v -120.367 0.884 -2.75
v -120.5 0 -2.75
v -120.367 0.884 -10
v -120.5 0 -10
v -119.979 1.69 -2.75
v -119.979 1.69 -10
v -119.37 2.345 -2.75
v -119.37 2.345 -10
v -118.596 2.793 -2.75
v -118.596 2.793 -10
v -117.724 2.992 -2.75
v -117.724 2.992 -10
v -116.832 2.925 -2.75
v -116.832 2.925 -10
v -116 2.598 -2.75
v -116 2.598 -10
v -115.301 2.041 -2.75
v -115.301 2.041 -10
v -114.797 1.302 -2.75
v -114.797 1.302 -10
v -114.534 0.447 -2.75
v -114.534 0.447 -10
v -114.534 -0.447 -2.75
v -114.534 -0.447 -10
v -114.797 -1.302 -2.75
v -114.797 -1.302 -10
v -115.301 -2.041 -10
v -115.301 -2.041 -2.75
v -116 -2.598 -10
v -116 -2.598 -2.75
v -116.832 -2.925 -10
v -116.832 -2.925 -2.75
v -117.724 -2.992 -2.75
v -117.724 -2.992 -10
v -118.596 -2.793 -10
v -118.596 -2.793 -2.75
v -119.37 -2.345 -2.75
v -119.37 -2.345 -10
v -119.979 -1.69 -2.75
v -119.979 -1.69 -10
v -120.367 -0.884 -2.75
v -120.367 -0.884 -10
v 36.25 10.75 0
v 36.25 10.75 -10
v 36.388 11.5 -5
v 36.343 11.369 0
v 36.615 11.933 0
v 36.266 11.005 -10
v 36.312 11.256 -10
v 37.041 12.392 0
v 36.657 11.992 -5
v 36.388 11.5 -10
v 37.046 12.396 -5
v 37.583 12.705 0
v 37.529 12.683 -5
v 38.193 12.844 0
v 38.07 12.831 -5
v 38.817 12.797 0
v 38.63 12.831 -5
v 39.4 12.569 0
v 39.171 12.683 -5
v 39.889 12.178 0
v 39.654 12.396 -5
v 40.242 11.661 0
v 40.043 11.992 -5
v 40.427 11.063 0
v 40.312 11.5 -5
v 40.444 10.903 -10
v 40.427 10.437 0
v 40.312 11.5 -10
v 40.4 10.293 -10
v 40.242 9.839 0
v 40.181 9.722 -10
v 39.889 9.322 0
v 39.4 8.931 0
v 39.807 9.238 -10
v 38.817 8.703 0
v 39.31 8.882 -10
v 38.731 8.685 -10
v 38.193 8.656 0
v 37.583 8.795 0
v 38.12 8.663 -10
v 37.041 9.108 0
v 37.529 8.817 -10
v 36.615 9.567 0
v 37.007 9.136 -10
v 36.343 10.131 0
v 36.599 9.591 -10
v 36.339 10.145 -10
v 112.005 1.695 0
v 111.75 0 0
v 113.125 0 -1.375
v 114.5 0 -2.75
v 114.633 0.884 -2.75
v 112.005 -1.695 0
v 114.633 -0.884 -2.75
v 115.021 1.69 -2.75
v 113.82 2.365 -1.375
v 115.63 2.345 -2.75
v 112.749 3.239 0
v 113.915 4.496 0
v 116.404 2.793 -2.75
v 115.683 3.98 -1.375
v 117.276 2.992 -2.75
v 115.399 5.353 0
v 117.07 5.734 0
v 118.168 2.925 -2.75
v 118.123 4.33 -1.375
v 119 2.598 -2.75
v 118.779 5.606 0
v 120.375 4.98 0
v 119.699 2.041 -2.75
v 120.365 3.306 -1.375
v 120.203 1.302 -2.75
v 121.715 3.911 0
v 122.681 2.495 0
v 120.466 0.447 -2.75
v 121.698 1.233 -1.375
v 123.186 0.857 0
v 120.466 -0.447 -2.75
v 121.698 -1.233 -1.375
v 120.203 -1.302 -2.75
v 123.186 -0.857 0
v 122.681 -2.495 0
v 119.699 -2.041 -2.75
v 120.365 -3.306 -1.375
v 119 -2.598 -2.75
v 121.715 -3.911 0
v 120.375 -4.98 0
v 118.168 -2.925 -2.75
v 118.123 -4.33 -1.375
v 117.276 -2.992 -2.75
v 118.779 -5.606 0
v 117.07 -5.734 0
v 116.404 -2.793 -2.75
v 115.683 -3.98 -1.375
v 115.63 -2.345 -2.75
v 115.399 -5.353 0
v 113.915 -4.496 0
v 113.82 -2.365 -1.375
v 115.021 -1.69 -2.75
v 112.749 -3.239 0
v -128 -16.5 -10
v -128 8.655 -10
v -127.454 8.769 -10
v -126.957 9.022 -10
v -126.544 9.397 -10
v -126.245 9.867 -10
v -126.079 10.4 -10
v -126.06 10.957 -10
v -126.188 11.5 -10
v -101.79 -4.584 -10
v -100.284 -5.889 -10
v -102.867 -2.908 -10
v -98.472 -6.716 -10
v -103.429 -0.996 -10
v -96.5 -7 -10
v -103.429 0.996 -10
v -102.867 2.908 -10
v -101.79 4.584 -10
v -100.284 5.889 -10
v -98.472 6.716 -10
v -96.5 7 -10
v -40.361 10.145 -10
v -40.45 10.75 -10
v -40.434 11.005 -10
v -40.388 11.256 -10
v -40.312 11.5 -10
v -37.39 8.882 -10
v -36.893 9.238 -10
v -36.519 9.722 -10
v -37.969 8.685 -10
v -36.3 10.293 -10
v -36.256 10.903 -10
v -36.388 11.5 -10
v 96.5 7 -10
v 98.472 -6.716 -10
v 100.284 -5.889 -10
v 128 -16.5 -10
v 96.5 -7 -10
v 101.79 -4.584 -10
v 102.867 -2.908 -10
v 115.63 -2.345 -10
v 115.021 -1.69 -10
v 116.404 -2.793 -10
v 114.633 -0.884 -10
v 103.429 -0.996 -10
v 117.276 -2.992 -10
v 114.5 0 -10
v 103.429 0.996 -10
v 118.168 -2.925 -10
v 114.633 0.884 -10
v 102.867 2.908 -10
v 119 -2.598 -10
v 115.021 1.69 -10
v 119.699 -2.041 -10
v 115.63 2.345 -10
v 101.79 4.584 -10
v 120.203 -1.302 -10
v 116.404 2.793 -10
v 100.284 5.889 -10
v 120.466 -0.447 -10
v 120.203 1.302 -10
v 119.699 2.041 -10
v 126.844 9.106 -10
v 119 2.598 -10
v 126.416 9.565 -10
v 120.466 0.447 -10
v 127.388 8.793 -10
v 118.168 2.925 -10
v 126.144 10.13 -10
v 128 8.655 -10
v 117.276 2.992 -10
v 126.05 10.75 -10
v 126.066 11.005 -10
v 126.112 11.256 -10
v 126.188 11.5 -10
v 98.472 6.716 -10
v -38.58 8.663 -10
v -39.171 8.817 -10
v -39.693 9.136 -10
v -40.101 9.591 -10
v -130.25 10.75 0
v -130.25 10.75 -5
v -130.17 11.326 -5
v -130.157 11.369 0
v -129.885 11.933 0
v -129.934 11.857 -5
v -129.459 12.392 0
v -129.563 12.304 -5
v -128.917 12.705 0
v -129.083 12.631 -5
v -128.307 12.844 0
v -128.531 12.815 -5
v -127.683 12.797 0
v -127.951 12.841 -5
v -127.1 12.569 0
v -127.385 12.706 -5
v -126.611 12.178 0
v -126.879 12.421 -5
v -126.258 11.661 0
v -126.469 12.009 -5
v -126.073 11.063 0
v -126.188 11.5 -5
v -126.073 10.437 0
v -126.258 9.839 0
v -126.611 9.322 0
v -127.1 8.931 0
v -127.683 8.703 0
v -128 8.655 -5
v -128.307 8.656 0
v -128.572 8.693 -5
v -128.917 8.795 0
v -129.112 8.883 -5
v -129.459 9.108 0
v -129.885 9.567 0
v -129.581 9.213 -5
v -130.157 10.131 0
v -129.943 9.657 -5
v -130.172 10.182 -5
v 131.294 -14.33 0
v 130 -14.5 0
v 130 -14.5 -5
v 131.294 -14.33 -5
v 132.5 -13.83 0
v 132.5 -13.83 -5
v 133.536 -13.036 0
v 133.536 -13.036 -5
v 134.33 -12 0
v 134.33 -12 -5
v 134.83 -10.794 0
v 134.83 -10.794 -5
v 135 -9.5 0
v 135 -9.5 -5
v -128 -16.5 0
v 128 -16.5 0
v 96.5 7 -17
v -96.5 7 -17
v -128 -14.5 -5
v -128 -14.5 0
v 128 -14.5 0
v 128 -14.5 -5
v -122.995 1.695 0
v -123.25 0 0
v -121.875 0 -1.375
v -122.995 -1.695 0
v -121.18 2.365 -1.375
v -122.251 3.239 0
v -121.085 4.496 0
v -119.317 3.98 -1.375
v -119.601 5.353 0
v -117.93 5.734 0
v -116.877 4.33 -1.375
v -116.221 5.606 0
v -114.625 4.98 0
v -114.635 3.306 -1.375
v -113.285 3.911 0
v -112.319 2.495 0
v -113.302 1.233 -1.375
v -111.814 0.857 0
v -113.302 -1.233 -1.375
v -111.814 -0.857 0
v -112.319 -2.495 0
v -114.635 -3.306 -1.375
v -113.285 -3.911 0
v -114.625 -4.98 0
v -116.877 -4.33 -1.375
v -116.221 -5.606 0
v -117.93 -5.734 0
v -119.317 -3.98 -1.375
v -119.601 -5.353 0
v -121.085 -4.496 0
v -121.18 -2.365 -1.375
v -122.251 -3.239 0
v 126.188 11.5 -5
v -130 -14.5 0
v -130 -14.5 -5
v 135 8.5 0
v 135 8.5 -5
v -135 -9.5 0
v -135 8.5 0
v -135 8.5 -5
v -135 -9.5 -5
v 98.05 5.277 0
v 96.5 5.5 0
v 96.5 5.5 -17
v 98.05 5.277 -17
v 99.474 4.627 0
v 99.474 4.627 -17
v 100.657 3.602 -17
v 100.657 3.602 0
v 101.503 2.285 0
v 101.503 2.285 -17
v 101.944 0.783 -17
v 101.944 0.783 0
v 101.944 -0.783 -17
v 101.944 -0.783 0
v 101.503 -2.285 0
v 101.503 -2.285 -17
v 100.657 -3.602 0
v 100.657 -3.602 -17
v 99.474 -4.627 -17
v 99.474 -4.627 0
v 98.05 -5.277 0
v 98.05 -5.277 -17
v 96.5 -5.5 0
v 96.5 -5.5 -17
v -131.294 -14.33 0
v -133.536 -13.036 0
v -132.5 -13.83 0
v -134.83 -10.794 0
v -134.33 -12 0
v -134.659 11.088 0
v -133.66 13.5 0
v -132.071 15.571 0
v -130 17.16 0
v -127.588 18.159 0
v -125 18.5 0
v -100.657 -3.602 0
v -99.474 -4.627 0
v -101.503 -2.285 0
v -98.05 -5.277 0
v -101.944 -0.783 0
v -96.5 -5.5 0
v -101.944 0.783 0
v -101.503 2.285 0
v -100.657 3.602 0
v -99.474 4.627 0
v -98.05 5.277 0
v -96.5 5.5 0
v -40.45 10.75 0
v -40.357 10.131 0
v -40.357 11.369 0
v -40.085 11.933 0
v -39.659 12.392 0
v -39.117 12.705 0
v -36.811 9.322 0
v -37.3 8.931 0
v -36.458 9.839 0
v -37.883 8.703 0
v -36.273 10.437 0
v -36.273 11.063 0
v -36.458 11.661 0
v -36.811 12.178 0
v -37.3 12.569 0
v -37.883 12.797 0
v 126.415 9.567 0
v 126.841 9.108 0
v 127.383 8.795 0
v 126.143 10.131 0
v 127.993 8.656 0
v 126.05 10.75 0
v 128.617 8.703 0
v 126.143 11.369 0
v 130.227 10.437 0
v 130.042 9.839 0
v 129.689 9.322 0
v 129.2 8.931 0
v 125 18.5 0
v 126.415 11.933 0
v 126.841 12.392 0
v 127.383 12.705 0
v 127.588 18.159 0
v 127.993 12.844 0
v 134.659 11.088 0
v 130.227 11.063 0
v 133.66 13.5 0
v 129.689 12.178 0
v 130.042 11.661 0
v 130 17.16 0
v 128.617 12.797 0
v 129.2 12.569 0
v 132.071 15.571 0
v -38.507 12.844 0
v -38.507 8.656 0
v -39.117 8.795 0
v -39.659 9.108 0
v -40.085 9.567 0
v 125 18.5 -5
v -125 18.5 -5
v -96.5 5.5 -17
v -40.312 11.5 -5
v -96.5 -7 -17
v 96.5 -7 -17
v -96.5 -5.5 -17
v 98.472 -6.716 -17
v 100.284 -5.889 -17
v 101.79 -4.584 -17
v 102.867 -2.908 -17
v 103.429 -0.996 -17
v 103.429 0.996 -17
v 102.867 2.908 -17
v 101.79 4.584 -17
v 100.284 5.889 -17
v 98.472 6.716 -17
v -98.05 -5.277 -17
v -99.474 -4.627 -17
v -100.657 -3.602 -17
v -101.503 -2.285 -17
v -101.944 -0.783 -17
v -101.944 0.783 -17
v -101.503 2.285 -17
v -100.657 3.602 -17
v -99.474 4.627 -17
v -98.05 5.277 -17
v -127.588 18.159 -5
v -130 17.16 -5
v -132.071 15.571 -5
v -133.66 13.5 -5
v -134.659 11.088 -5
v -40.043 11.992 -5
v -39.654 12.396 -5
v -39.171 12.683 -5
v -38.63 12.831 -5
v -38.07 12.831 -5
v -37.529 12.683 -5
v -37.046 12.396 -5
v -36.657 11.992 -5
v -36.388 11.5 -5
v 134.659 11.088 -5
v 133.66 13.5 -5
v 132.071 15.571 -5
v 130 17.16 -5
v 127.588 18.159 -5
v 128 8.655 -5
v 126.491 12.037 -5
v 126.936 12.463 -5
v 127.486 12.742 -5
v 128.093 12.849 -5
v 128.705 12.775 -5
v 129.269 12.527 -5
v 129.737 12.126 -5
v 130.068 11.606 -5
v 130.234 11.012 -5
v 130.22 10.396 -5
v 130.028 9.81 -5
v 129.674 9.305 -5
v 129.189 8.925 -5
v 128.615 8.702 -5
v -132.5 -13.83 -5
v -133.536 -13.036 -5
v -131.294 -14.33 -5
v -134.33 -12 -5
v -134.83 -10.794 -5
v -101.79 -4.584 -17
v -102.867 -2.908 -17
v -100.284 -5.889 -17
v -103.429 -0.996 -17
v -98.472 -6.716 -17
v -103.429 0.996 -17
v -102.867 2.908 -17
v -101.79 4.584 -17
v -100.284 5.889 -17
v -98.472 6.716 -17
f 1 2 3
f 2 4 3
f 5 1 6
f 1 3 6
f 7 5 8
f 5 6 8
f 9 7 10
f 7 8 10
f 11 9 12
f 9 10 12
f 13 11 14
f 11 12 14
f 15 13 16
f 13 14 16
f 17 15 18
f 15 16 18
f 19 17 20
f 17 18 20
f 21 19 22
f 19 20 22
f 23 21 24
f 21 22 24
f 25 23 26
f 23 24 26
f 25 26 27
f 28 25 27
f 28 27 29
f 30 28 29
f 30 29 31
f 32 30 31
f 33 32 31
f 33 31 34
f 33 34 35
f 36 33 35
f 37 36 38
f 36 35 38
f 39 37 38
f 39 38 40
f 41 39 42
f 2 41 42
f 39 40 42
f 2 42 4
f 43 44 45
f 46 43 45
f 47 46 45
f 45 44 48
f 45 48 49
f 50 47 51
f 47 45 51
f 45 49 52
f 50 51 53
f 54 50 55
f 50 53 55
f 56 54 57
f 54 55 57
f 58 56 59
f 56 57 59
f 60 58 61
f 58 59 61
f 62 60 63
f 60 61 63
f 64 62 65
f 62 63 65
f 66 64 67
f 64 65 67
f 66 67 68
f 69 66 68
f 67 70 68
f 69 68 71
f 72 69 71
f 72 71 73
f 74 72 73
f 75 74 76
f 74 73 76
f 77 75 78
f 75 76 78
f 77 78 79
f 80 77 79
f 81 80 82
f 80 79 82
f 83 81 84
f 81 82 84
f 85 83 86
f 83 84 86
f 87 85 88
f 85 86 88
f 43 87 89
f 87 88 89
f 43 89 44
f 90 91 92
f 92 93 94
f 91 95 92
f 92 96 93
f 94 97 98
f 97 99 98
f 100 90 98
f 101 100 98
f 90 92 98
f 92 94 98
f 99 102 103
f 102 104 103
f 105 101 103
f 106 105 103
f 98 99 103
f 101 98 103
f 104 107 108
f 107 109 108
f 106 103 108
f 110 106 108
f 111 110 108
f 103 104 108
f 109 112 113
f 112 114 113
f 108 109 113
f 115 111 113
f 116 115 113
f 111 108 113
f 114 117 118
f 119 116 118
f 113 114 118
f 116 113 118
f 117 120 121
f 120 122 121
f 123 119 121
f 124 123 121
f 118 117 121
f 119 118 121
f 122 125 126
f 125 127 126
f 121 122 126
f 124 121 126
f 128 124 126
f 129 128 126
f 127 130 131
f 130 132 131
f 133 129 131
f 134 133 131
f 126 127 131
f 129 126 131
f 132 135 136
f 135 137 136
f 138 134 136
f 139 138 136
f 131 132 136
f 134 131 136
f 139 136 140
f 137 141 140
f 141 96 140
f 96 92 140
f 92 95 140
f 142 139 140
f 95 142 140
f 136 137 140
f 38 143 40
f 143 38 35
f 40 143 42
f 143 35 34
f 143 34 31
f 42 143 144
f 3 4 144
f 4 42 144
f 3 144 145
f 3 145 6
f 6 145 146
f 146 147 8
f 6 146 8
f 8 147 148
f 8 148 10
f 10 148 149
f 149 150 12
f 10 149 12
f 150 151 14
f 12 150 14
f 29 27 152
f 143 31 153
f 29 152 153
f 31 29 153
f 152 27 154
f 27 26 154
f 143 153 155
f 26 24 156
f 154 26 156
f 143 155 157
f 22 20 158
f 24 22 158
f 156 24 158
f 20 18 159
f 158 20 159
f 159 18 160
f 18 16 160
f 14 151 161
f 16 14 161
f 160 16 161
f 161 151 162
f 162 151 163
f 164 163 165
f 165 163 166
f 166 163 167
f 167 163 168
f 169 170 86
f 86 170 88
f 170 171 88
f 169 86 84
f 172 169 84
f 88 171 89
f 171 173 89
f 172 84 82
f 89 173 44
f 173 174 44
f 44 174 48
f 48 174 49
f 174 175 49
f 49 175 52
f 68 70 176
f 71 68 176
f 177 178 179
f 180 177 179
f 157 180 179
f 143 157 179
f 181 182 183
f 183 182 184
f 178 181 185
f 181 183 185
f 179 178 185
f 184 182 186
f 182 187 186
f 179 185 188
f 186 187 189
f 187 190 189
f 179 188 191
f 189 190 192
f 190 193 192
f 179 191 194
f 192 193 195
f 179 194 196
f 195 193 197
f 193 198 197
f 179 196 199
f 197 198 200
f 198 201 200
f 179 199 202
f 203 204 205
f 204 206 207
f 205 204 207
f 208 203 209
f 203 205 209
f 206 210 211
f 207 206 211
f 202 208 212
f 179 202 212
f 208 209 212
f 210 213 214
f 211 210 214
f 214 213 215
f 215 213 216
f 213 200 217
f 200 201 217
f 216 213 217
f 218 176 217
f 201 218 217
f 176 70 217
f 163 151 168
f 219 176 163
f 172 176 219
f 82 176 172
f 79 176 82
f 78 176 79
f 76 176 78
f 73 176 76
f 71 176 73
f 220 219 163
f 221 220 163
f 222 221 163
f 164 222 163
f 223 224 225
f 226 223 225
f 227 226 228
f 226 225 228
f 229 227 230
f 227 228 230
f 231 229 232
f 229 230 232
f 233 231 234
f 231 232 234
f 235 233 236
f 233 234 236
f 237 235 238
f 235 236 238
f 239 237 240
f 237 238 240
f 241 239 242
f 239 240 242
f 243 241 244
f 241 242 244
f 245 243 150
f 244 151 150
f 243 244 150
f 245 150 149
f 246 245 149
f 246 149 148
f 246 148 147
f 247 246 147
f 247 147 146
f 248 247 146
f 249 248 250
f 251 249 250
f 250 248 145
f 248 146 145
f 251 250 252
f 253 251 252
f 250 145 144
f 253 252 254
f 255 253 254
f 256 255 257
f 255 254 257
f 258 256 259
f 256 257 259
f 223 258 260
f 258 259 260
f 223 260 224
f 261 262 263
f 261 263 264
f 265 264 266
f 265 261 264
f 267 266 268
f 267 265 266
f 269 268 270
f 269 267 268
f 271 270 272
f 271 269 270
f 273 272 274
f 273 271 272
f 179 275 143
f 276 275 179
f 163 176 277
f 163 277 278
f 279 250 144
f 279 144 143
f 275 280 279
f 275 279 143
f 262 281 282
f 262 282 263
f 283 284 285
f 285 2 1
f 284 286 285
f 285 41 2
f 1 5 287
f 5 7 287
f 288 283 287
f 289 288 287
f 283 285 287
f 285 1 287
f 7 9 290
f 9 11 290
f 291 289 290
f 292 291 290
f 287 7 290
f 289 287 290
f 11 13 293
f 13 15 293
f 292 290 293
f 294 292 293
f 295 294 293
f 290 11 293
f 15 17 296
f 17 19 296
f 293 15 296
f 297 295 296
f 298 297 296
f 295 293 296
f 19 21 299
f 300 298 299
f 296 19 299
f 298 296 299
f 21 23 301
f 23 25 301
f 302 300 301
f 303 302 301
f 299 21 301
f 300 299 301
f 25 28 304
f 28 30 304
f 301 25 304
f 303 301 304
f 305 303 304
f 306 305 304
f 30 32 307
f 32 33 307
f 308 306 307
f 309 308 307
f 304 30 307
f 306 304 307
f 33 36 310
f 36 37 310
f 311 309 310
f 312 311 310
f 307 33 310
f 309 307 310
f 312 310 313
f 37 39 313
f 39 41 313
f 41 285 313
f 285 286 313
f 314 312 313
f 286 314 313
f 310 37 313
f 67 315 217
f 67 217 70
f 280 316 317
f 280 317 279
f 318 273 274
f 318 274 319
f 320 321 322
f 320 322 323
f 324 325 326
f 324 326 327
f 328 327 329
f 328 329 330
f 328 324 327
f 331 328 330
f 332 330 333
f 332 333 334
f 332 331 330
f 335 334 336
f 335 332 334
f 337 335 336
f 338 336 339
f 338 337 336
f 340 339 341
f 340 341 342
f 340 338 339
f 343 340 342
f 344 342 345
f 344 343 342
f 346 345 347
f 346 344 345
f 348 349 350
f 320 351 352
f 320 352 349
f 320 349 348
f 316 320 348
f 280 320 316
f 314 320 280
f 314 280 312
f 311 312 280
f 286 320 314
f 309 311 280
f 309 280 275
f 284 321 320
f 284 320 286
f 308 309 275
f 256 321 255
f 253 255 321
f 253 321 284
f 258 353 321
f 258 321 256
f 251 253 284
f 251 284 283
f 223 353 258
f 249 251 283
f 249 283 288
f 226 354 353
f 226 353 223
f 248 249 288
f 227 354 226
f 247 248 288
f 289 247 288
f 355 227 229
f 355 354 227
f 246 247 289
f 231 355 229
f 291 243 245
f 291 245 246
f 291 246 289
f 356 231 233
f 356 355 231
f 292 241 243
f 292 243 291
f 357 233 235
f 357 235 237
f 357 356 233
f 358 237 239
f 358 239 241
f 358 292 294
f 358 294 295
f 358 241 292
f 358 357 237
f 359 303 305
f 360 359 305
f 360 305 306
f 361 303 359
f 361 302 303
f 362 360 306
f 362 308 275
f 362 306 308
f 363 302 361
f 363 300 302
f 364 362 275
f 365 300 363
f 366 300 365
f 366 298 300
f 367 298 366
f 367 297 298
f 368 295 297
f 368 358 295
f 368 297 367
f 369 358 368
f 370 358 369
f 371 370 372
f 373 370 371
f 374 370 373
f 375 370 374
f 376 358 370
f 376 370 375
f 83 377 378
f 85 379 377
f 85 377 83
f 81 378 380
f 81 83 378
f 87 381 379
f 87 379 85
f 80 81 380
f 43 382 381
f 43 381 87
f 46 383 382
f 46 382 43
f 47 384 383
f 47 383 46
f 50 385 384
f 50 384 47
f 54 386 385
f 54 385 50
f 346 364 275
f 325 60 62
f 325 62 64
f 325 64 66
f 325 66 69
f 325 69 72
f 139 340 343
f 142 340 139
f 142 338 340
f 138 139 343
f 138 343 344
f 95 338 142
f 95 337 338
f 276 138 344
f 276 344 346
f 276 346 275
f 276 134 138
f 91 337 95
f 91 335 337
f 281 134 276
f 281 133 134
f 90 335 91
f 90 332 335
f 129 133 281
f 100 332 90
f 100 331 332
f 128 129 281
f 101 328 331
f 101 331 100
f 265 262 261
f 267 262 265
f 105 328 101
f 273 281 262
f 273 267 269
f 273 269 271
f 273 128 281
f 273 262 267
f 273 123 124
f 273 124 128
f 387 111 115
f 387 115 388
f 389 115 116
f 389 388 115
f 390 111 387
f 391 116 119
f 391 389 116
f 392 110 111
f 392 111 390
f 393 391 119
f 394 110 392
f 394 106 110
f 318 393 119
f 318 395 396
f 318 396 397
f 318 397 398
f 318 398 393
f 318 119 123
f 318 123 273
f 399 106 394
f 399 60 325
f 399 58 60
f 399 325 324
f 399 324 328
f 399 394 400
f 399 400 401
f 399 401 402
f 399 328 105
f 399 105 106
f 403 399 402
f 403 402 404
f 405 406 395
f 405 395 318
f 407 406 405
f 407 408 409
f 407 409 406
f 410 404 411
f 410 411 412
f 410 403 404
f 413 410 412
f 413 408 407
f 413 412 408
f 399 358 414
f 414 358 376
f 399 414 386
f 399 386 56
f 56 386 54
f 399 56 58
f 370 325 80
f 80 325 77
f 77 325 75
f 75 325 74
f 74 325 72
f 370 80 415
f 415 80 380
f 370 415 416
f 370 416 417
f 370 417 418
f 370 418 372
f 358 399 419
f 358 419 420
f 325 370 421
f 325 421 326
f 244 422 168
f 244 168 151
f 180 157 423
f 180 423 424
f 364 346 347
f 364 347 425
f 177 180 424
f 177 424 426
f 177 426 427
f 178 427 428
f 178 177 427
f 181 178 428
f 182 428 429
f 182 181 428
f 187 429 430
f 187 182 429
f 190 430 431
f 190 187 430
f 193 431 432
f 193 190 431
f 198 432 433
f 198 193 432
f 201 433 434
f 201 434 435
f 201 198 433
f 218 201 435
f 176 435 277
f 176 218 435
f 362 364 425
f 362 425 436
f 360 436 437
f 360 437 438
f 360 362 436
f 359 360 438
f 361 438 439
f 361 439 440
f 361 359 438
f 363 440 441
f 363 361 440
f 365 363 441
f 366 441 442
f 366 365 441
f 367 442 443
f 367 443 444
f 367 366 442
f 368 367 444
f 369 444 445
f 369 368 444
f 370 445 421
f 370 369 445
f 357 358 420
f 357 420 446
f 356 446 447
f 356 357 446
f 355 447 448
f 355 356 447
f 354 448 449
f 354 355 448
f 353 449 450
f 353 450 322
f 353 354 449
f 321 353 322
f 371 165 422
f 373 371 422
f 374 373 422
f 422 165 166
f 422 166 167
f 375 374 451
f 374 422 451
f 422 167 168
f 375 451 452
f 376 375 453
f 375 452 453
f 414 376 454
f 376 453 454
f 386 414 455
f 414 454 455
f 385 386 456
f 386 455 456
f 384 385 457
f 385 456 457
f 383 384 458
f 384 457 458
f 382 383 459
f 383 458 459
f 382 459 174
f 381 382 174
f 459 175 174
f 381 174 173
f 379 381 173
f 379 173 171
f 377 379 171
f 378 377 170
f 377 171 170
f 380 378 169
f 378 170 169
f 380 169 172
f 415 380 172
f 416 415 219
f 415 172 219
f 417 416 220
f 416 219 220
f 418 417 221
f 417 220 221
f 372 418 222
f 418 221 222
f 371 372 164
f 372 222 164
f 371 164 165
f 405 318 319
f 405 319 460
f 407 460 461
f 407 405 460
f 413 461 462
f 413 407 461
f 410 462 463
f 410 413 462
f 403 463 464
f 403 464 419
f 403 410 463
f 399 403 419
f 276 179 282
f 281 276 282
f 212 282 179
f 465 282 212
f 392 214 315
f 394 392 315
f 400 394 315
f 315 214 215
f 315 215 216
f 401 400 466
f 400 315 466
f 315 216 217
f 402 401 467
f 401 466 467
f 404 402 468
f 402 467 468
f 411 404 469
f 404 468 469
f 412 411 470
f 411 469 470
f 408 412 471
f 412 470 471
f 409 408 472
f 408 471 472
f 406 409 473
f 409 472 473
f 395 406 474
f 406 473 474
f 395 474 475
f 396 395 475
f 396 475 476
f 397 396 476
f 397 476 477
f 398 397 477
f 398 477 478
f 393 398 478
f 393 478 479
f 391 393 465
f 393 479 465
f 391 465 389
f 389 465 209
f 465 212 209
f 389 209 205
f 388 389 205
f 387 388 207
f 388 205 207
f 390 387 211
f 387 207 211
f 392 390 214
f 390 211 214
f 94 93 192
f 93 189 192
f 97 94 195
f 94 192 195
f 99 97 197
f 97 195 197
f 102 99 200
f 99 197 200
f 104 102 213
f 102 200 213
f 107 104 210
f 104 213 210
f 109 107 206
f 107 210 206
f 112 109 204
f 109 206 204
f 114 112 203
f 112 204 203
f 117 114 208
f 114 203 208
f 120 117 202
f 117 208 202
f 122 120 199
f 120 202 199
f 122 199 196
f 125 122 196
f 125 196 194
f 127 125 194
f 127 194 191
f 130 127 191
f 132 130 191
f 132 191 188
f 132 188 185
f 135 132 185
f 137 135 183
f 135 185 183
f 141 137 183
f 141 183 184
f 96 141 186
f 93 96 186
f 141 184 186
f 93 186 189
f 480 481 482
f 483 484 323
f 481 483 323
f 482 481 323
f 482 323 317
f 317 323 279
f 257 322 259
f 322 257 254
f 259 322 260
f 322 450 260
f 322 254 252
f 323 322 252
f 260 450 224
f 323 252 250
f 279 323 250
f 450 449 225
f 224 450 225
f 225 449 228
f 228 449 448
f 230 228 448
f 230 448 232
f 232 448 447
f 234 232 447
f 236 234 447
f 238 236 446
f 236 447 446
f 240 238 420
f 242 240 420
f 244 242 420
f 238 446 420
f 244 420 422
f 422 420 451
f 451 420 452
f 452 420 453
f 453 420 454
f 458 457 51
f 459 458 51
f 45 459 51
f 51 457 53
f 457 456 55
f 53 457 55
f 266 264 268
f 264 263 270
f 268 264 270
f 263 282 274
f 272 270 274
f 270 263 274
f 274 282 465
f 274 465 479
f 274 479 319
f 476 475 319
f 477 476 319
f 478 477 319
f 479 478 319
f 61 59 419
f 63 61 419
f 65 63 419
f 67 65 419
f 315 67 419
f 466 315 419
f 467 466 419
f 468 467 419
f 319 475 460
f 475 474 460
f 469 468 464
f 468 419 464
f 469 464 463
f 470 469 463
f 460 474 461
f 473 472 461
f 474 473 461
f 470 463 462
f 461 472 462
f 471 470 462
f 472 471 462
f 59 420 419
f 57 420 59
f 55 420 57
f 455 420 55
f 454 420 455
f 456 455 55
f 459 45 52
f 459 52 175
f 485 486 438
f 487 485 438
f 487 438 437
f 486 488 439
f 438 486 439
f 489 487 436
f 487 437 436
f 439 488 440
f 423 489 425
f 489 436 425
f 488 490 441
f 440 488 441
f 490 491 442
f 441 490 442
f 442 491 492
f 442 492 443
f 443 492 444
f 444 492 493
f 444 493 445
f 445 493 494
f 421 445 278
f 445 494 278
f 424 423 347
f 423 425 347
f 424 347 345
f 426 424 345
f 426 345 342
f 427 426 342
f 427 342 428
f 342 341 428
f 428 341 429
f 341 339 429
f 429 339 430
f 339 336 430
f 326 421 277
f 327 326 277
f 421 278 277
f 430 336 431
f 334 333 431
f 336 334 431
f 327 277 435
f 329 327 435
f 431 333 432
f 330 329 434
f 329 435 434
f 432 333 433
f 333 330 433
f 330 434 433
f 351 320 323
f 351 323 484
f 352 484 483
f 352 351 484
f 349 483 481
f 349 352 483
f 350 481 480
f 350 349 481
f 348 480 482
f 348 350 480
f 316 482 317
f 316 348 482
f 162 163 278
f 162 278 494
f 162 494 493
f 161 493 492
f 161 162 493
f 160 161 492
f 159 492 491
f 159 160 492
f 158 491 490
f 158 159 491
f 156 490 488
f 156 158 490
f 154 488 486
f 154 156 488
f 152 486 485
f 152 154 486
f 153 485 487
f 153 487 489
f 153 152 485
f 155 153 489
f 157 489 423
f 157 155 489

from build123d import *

# Parameters (mm, degrees)
F1_DEPTH       = 17
F2_DEPTH       = 10
F3_DEPTH       = 5
F4_D           = 6
F4_CSINK_D     = 11.5
F4_CSINK_ANGLE = 90
F5_D           = 4.2


with BuildPart() as f1:
    # F0 (on Top) → F1 (new body)
    with BuildSketch(Plane.XY):
        with BuildLine():
            ThreePointArc((-96.5, 7), (-103.5, 0), (-96.5, -7))
            Line((-96.5, -7), (96.5, -7))
            ThreePointArc((96.5, -7), (103.5, 0), (96.5, 7))
            Line((96.5, 7), (-96.5, 7))
        make_face()
        with BuildLine():
            ThreePointArc((-96.5, -5.5), (-102, 0), (-96.5, 5.5))
            Line((-96.5, 5.5), (96.5, 5.5))
            ThreePointArc((96.5, 5.5), (102, 0), (96.5, -5.5))
            Line((96.5, -5.5), (-96.5, -5.5))
        make_face(mode=Mode.SUBTRACT)
    extrude(amount=-F1_DEPTH)

    # F0 (on Top) → F2 (join)
    with BuildSketch(Plane.XY):
        Polygon((-128, 11.5), (-128, -14.5), (-128, -16.5), (128, -16.5), (128, -14.5), (128, 11.5), align=None)
        with BuildLine():
            Line((96.5, -7), (-96.5, -7))
            ThreePointArc((-96.5, -7), (-103.5, 0), (-96.5, 7))
            Line((-96.5, 7), (96.5, 7))
            ThreePointArc((96.5, 7), (103.5, 0), (96.5, -7))
        make_face(mode=Mode.SUBTRACT)
    extrude(amount=-F2_DEPTH)

    # F0 (on Top) → F3 (join)
    with BuildSketch(Plane.XY):
        with BuildLine():
            Line((125, 18.5), (-125, 18.5))
            ThreePointArc((-125, 18.5), (-132.0710678119, 15.5710678119), (-135, 8.5))
            Line((-135, 8.5), (-135, -9.5))
            ThreePointArc((-135, -9.5), (-133.5355339059, -13.0355339059), (-130, -14.5))
            Line((-130, -14.5), (-128, -14.5))
            Line((-128, -14.5), (-128, 11.5))
            Line((-128, 11.5), (128, 11.5))
            Line((128, 11.5), (128, -14.5))
            Line((128, -14.5), (130, -14.5))
            ThreePointArc((130, -14.5), (133.5355339059, -13.0355339059), (135, -9.5))
            Line((135, -9.5), (135, 8.5))
            ThreePointArc((135, 8.5), (132.0710678119, 15.5710678119), (125, 18.5))
        make_face()
    extrude(amount=-F3_DEPTH)

    # F4 (through all)
    with Locations(Plane.XY):
        with Locations((117.5, 0), (-117.5, 0)):
            CounterSinkHole(F4_D / 2, F4_CSINK_D / 2, counter_sink_angle=F4_CSINK_ANGLE)

    # F5 (through all)
    with Locations(Plane.XY):
        with Locations((-128.15, 10.75), (-38.35, 10.75), (38.35, 10.75), (128.15, 10.75)):
            Hole(F5_D / 2)


solid = f1.part
